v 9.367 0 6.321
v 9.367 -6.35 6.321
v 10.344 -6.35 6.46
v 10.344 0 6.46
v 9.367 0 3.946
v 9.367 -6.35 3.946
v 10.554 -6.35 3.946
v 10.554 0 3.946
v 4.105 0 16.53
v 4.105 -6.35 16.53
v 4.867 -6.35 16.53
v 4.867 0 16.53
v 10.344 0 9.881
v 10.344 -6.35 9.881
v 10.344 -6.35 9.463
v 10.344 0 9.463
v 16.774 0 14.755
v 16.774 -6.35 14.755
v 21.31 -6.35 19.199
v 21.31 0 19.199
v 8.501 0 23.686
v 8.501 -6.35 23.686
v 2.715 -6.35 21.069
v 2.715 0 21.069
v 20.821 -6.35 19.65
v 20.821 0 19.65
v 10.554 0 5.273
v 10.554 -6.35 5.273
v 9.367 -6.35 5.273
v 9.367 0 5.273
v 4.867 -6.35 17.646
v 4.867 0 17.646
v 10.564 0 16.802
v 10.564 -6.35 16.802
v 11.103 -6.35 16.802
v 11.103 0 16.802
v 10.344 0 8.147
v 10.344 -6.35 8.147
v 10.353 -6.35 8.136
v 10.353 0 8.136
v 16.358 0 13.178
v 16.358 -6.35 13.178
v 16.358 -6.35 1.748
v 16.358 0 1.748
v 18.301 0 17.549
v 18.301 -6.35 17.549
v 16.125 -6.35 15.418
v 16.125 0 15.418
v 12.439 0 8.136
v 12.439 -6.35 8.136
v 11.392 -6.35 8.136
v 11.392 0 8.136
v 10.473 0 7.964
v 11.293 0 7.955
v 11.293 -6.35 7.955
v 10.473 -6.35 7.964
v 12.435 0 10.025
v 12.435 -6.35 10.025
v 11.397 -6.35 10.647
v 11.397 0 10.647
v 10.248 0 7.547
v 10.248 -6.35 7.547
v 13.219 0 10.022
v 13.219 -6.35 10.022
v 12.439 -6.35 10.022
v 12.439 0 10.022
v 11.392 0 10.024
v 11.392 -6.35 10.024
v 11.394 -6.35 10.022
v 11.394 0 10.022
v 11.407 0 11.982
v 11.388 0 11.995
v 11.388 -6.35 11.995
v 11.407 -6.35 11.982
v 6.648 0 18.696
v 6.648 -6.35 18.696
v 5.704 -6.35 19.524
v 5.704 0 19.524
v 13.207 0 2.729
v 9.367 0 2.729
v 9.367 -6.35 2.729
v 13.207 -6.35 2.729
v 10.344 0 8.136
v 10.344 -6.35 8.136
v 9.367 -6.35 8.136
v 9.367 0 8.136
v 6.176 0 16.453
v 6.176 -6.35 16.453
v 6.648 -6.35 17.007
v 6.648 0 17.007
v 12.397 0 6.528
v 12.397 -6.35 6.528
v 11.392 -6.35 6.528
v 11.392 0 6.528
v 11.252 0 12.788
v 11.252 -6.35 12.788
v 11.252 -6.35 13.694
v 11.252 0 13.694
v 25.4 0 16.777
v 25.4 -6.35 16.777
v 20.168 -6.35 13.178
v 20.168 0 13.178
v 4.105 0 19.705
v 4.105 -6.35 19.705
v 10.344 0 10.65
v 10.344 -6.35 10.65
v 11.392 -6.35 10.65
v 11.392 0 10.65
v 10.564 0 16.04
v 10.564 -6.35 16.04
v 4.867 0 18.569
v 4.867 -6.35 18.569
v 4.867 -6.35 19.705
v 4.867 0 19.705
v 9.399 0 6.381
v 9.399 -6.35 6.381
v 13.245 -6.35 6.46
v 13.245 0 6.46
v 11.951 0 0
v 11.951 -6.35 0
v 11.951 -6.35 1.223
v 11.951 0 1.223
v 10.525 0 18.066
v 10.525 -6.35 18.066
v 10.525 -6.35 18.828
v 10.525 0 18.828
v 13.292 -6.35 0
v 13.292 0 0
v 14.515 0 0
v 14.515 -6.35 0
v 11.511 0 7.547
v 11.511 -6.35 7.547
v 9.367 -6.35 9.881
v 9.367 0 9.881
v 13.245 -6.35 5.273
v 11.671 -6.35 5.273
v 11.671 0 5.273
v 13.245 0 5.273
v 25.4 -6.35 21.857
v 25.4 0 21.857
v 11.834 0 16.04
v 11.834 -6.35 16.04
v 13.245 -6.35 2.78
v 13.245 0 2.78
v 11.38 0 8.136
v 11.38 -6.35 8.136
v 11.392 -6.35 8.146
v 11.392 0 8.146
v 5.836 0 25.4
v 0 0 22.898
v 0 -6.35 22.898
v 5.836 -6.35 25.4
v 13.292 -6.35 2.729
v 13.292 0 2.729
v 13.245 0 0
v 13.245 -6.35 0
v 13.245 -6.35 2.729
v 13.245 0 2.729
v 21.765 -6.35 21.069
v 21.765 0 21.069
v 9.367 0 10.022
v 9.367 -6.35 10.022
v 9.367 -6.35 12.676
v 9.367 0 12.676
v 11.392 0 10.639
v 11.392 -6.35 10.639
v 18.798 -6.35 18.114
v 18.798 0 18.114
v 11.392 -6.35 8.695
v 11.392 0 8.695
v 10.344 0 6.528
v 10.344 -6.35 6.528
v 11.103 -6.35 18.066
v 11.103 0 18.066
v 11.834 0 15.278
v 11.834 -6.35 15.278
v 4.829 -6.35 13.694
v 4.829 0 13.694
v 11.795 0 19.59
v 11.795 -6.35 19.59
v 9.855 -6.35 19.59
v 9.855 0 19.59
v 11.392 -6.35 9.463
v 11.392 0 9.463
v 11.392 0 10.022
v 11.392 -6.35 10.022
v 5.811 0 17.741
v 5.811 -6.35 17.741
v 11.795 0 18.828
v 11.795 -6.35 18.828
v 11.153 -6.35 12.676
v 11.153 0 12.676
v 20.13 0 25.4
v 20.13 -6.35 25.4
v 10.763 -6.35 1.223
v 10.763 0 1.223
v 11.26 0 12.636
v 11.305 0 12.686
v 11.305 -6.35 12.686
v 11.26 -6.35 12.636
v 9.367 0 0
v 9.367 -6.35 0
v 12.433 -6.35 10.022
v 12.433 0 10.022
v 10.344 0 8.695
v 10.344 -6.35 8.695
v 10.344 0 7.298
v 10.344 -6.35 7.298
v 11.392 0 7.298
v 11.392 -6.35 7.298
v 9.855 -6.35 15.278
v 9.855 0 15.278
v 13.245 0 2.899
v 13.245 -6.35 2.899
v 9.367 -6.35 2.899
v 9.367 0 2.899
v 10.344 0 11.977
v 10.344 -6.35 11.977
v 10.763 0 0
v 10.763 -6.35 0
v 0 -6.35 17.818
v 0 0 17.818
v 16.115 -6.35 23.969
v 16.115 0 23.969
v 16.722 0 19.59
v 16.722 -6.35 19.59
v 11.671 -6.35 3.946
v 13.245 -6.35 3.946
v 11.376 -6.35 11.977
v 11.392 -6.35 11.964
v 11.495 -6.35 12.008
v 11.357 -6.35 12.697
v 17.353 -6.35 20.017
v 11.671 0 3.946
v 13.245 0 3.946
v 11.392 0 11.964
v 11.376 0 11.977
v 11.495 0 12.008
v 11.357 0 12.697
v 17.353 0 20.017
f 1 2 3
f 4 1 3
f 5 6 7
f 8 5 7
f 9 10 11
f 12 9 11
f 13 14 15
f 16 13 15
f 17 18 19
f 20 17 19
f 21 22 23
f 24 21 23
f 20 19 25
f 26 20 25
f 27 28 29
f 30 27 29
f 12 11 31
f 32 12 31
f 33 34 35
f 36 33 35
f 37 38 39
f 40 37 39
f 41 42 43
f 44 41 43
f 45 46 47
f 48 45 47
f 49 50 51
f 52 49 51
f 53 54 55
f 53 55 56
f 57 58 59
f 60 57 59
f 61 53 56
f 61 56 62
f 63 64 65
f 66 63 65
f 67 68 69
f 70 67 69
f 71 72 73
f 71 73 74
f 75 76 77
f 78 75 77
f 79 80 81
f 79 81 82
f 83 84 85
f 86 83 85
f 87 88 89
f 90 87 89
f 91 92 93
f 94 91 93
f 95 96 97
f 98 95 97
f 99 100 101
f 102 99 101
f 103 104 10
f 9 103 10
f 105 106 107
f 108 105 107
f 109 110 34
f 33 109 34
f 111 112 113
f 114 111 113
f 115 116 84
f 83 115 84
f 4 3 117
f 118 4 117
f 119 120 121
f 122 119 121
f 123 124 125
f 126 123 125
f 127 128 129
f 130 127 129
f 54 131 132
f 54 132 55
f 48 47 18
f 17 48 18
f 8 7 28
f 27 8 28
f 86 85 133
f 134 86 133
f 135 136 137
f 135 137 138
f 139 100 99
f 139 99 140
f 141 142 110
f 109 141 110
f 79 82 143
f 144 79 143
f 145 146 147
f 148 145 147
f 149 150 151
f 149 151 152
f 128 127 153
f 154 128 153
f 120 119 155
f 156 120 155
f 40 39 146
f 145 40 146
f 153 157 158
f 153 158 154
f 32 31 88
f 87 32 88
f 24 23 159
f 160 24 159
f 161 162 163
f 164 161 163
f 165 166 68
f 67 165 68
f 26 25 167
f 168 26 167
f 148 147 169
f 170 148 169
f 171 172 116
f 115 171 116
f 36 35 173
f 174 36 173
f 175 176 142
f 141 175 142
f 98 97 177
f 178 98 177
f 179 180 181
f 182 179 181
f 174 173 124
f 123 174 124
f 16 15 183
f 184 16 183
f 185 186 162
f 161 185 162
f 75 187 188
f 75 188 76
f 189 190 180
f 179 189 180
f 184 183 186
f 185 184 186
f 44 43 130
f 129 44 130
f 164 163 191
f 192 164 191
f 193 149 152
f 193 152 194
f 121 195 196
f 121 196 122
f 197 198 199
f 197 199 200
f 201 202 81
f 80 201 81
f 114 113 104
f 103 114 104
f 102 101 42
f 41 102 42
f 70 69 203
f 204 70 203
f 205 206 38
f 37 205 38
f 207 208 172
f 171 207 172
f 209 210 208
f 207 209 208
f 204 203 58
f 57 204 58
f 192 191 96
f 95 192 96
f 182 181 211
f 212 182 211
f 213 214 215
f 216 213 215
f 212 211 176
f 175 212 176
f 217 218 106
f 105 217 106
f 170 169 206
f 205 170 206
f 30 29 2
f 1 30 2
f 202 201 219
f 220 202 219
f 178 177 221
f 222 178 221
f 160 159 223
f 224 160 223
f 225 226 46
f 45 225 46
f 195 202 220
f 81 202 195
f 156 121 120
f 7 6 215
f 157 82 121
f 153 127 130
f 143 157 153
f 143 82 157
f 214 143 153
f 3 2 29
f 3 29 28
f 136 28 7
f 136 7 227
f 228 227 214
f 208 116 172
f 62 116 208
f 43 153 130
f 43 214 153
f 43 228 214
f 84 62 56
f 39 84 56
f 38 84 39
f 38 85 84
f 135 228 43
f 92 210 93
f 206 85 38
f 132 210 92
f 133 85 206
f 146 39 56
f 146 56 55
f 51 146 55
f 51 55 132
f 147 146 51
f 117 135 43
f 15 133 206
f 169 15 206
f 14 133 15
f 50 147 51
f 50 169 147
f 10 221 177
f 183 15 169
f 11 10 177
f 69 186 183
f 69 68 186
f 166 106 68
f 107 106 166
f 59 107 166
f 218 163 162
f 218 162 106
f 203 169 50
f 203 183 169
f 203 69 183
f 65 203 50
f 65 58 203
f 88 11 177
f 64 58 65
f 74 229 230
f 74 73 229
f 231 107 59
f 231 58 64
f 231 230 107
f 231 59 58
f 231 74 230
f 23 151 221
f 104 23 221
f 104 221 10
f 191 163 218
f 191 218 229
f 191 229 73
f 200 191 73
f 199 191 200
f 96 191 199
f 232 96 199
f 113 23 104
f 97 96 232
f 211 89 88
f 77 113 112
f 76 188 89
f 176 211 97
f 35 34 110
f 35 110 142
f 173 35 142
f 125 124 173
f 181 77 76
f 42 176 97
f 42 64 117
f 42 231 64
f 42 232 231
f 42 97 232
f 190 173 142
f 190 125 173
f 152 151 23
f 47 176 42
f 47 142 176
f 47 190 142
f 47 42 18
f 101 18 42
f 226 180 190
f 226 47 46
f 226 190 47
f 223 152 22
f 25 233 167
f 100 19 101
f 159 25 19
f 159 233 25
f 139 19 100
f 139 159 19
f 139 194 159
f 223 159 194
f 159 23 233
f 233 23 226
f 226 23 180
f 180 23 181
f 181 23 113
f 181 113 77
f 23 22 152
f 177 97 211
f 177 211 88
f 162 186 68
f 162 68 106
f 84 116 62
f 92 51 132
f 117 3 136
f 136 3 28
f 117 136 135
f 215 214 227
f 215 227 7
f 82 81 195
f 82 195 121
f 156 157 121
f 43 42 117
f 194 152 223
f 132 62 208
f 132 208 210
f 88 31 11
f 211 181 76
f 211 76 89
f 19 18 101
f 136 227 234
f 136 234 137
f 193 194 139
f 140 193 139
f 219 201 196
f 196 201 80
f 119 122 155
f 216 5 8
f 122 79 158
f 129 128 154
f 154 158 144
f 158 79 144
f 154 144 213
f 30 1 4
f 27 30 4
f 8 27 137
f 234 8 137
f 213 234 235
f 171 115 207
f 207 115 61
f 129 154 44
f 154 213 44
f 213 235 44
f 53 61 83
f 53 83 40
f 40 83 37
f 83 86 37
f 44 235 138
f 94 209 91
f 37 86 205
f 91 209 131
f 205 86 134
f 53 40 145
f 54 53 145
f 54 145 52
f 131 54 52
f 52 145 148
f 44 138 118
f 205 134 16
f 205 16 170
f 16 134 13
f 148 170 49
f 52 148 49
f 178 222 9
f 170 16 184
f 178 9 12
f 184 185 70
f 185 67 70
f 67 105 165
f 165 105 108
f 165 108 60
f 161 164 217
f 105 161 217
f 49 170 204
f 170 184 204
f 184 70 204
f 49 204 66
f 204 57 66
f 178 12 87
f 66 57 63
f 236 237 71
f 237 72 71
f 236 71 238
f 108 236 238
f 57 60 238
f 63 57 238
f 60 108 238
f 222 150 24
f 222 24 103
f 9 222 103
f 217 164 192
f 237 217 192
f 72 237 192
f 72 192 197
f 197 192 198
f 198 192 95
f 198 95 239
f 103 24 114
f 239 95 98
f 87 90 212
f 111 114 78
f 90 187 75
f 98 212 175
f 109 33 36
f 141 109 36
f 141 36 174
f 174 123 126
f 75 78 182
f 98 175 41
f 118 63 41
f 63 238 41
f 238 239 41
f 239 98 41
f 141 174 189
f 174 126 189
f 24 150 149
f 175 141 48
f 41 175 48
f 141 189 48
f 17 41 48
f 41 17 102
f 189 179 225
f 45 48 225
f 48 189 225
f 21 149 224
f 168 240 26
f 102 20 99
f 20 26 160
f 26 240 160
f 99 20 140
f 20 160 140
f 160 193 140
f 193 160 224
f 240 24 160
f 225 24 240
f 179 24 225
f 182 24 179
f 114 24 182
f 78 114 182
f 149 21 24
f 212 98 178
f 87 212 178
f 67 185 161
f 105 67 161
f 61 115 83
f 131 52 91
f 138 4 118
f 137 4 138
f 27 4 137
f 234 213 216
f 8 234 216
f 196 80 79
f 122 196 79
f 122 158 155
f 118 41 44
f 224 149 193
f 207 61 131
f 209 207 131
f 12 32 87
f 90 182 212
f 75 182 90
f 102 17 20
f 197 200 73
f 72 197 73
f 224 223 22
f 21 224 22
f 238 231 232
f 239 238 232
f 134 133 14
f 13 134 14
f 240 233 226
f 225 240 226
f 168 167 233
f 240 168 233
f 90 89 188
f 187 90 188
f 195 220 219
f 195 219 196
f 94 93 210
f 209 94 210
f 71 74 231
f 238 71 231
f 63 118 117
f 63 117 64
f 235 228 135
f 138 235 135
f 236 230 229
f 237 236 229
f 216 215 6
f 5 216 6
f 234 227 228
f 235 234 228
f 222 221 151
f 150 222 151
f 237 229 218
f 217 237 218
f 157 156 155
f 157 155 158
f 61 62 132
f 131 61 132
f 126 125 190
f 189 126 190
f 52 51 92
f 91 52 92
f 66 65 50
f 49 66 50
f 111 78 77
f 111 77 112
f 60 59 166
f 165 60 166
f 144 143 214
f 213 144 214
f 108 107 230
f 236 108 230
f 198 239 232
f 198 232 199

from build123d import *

# Parameters (mm, degrees)
F0_W      = 25.4
F0_H      = 25.4
F1_DEPTH  = 6.35
F3_DEPTH  = 25.4
F4_DEPTH  = 25.4
F2_W      = 1.5741327426
F2_H      = 1.3268706389
F2_W_2    = 1.187200658
F2_H_2    = 1.2226499384
F5_DEPTH  = 25.4
F6_DEPTH  = 25.4
F7_DEPTH  = 25.4
F8_DEPTH  = 25.4
F9_DEPTH  = 25.4
F10_DEPTH = 25.4
F2_W_3    = 0.0468016022
F2_H_3    = 2.728624735
F11_DEPTH = 25.4


with BuildPart() as f1:
    # F0 (on Front) → F1 (new body)
    with BuildSketch(Plane.XZ):
        with Locations((12.7, 12.7)):
            Rectangle(F0_W, F0_H)
    extrude(amount=F1_DEPTH)

    # F2 (on face) → F3 (cut)
    with BuildSketch(Plane.XZ.offset(6.35)):
        Polygon((11.3045458782, 12.6861063085), (11.2601406232, 12.6359642364), (11.3882992748, 11.9951701235), (11.4073375334, 11.9818783017), (11.4946379989, 12.0078130807), (11.3568859374, 12.6965743064), align=None)
    extrude(amount=-F3_DEPTH, mode=Mode.SUBTRACT)

    # F2 (on face) → F4 (cut)
    with BuildSketch(Plane.XZ.offset(6.35)):
        Polygon((4.8667113453, 19.705099985), (4.1047113453, 19.705099985), (4.1047113453, 16.530099985), (4.8667113453, 16.530099985), (4.8667113453, 17.646435377), (6.1755171202, 16.4531112731), (6.6484752777, 17.0069300941), (5.8113521077, 17.7406859724), (6.6484752777, 18.6957382214), (5.7038345153, 19.5237355067), (4.8667113453, 18.5686832578), align=None)
        Polygon((17.3532462063, 20.0170688259), (16.7224295437, 19.5896178484), (18.3006953448, 17.5494197756), (16.1248423702, 15.4179709552), (16.7738881073, 14.7554037454), (21.310064048, 19.1990067695), (20.8210359426, 19.650104071), (18.7980631883, 18.1141414298), align=None)
        Polygon((9.8554994911, 19.5896178484), (9.8554994911, 17.7037799731), (9.8554994911, 15.278255567), (11.8336537853, 15.278255567), (11.8336537853, 16.040255567), (10.5636537853, 16.040255567), (10.5636537853, 16.802255567), (11.1025738376, 16.802255567), (11.1025738376, 18.0656178484), (10.5251594293, 18.0656178484), (10.5251594293, 18.8276178484), (11.7951594293, 18.8276178484), (11.7951594293, 19.5896178484), align=None)
    extrude(amount=-F4_DEPTH, mode=Mode.SUBTRACT)

    # F2 (on face) → F5 (cut)
    with BuildSketch(Plane.XZ.offset(6.35)):
        Polygon((11.3918762654, 11.963872239), (11.3760931417, 11.9772851467), (10.3443460539, 11.9772851467), (10.3443460539, 10.6504149735), (11.3918762654, 10.6504149735), align=None)
        Polygon((10.3443460539, 6.4602969214), (11.3918762654, 6.4602969214), (11.3918762654, 6.5283267759), (11.3918762654, 7.2983205318), (10.3443460539, 7.2983205318), (10.3443460539, 6.5283267759), align=None)
        with Locations((12.4582835298, 4.6096618753)):
            Rectangle(F2_W, F2_H)
        with Locations((11.3569586538, 0.6113249692)):
            Rectangle(F2_W_2, F2_H_2)
        Polygon((11.3918762654, 10.0218970329), (10.3443460539, 10.0218970329), (10.3443460539, 9.8811993375), (10.3443460539, 9.4632143155), (11.3918762654, 9.4632143155), align=None)
    extrude(amount=-F5_DEPTH, mode=Mode.SUBTRACT)

    # F2 (on face) → F6 (cut)
    with BuildSketch(Plane.XZ.offset(6.35)):
        Polygon((12.4394055456, 6.4602969214), (13.2453499011, 6.4602969214), (12.4394055456, 8.1363441423), (11.3918762654, 8.1363441423), (12.396886896, 6.5283267759), align=None)
        Polygon((12.4394055456, 8.1363441423), (13.2453499011, 6.4602969214), (13.2194478065, 10.0218970329), (12.4394055456, 10.0218970329), align=None)
    extrude(amount=-F6_DEPTH, mode=Mode.SUBTRACT)

    # F2 (on face) → F7 (cut)
    with BuildSketch(Plane.XZ.offset(6.35)):
        Polygon((10.3443460539, 8.6950268596), (10.3443460539, 8.1466408446), (10.3525146842, 8.1363441423), (11.3799376413, 8.1363441423), (11.3918762654, 8.1456918269), (11.3918762654, 8.6950268596), align=None)
        Polygon((11.3918762654, 10.63934993), (11.3918762654, 10.0235464051), (11.3941496238, 10.0218970329), (12.4334173265, 10.0218970329), (12.4350024447, 10.0245388949), (11.3967579036, 10.6474859888), align=None)
    extrude(amount=-F7_DEPTH, mode=Mode.SUBTRACT)

    # F2 (on face) → F8 (cut)
    with BuildSketch(Plane.XZ.offset(6.35)):
        Polygon((0, 22.8981861721), (5.8363882299, 25.4), (0, 25.4), align=None)
        Polygon((25.4, 25.4), (20.1304874707, 25.4), (25.4, 21.8567334698), align=None)
        Polygon((4.8287836991, 13.6944320588), (0, 17.8181861721), (0, 0), (9.3666529283, 0), (9.3666529283, 2.728624735), (13.2070397958, 2.728624735), (13.2453499011, 2.7803417761), (13.2453499011, 2.8986970428), (9.3666529283, 2.8986970428), (9.3666529283, 3.9462265559), (10.553852655, 3.9462265559), (10.553852655, 5.2730971947), (9.3666529283, 5.2730971947), (9.3666529283, 6.3206264749), (9.3993271689, 6.3813072698), (10.3443460539, 8.1363441423), (9.3666529283, 8.1363441423), (9.3666529283, 9.8811993375), (10.3443460539, 9.8811993375), (10.3443460539, 10.0218970329), (9.3666529283, 10.0218970329), (9.3666529283, 12.6756383106), (11.1529044807, 12.6756383106), (11.2522058189, 12.7877686173), (11.2522058189, 13.6944320588), align=None)
        Polygon((16.1153711372, 23.9690360215), (8.5006434467, 23.6856243072), (2.7146538465, 21.0693627863), (21.7646538465, 21.0693627863), align=None)
        Polygon((25.4, 0), (25.4, 16.7767334698), (20.1682399362, 13.1779577565), (16.3582399362, 13.1779577565), (16.3582399362, 1.7479577565), (14.5153499011, 0), align=None)
    extrude(amount=-F8_DEPTH, mode=Mode.SUBTRACT)

    # F2 (on face) → F9 (cut)
    with BuildSketch(Plane.XZ.offset(6.35)):
        Polygon((10.3443460539, 6.5283267759), (9.3993271689, 6.3813072698), (9.3666529283, 6.3206264749), (10.3443460539, 6.4602969214), align=None)
        Polygon((11.3918762654, 6.4602969214), (12.4394055456, 6.4602969214), (12.396886896, 6.5283267759), (11.3918762654, 6.5283267759), align=None)
    extrude(amount=-F9_DEPTH, mode=Mode.SUBTRACT)

    # F2 (on face) → F10 (cut)
    with BuildSketch(Plane.XZ.offset(6.35)):
        Polygon((11.2931728363, 7.9554002732), (10.4726087302, 7.9641295597), (10.2478063918, 7.5466390744), (11.5114087239, 7.5466390744), align=None)
    extrude(amount=-F10_DEPTH, mode=Mode.SUBTRACT)

    # F2 (on face) → F11 (cut)
    with BuildSketch(Plane.XZ.offset(6.35)):
        with Locations((13.2687507022, 1.3643123675)):
            Rectangle(F2_W_3, F2_H_3)
    extrude(amount=-F11_DEPTH, mode=Mode.SUBTRACT)


solid = f1.part
